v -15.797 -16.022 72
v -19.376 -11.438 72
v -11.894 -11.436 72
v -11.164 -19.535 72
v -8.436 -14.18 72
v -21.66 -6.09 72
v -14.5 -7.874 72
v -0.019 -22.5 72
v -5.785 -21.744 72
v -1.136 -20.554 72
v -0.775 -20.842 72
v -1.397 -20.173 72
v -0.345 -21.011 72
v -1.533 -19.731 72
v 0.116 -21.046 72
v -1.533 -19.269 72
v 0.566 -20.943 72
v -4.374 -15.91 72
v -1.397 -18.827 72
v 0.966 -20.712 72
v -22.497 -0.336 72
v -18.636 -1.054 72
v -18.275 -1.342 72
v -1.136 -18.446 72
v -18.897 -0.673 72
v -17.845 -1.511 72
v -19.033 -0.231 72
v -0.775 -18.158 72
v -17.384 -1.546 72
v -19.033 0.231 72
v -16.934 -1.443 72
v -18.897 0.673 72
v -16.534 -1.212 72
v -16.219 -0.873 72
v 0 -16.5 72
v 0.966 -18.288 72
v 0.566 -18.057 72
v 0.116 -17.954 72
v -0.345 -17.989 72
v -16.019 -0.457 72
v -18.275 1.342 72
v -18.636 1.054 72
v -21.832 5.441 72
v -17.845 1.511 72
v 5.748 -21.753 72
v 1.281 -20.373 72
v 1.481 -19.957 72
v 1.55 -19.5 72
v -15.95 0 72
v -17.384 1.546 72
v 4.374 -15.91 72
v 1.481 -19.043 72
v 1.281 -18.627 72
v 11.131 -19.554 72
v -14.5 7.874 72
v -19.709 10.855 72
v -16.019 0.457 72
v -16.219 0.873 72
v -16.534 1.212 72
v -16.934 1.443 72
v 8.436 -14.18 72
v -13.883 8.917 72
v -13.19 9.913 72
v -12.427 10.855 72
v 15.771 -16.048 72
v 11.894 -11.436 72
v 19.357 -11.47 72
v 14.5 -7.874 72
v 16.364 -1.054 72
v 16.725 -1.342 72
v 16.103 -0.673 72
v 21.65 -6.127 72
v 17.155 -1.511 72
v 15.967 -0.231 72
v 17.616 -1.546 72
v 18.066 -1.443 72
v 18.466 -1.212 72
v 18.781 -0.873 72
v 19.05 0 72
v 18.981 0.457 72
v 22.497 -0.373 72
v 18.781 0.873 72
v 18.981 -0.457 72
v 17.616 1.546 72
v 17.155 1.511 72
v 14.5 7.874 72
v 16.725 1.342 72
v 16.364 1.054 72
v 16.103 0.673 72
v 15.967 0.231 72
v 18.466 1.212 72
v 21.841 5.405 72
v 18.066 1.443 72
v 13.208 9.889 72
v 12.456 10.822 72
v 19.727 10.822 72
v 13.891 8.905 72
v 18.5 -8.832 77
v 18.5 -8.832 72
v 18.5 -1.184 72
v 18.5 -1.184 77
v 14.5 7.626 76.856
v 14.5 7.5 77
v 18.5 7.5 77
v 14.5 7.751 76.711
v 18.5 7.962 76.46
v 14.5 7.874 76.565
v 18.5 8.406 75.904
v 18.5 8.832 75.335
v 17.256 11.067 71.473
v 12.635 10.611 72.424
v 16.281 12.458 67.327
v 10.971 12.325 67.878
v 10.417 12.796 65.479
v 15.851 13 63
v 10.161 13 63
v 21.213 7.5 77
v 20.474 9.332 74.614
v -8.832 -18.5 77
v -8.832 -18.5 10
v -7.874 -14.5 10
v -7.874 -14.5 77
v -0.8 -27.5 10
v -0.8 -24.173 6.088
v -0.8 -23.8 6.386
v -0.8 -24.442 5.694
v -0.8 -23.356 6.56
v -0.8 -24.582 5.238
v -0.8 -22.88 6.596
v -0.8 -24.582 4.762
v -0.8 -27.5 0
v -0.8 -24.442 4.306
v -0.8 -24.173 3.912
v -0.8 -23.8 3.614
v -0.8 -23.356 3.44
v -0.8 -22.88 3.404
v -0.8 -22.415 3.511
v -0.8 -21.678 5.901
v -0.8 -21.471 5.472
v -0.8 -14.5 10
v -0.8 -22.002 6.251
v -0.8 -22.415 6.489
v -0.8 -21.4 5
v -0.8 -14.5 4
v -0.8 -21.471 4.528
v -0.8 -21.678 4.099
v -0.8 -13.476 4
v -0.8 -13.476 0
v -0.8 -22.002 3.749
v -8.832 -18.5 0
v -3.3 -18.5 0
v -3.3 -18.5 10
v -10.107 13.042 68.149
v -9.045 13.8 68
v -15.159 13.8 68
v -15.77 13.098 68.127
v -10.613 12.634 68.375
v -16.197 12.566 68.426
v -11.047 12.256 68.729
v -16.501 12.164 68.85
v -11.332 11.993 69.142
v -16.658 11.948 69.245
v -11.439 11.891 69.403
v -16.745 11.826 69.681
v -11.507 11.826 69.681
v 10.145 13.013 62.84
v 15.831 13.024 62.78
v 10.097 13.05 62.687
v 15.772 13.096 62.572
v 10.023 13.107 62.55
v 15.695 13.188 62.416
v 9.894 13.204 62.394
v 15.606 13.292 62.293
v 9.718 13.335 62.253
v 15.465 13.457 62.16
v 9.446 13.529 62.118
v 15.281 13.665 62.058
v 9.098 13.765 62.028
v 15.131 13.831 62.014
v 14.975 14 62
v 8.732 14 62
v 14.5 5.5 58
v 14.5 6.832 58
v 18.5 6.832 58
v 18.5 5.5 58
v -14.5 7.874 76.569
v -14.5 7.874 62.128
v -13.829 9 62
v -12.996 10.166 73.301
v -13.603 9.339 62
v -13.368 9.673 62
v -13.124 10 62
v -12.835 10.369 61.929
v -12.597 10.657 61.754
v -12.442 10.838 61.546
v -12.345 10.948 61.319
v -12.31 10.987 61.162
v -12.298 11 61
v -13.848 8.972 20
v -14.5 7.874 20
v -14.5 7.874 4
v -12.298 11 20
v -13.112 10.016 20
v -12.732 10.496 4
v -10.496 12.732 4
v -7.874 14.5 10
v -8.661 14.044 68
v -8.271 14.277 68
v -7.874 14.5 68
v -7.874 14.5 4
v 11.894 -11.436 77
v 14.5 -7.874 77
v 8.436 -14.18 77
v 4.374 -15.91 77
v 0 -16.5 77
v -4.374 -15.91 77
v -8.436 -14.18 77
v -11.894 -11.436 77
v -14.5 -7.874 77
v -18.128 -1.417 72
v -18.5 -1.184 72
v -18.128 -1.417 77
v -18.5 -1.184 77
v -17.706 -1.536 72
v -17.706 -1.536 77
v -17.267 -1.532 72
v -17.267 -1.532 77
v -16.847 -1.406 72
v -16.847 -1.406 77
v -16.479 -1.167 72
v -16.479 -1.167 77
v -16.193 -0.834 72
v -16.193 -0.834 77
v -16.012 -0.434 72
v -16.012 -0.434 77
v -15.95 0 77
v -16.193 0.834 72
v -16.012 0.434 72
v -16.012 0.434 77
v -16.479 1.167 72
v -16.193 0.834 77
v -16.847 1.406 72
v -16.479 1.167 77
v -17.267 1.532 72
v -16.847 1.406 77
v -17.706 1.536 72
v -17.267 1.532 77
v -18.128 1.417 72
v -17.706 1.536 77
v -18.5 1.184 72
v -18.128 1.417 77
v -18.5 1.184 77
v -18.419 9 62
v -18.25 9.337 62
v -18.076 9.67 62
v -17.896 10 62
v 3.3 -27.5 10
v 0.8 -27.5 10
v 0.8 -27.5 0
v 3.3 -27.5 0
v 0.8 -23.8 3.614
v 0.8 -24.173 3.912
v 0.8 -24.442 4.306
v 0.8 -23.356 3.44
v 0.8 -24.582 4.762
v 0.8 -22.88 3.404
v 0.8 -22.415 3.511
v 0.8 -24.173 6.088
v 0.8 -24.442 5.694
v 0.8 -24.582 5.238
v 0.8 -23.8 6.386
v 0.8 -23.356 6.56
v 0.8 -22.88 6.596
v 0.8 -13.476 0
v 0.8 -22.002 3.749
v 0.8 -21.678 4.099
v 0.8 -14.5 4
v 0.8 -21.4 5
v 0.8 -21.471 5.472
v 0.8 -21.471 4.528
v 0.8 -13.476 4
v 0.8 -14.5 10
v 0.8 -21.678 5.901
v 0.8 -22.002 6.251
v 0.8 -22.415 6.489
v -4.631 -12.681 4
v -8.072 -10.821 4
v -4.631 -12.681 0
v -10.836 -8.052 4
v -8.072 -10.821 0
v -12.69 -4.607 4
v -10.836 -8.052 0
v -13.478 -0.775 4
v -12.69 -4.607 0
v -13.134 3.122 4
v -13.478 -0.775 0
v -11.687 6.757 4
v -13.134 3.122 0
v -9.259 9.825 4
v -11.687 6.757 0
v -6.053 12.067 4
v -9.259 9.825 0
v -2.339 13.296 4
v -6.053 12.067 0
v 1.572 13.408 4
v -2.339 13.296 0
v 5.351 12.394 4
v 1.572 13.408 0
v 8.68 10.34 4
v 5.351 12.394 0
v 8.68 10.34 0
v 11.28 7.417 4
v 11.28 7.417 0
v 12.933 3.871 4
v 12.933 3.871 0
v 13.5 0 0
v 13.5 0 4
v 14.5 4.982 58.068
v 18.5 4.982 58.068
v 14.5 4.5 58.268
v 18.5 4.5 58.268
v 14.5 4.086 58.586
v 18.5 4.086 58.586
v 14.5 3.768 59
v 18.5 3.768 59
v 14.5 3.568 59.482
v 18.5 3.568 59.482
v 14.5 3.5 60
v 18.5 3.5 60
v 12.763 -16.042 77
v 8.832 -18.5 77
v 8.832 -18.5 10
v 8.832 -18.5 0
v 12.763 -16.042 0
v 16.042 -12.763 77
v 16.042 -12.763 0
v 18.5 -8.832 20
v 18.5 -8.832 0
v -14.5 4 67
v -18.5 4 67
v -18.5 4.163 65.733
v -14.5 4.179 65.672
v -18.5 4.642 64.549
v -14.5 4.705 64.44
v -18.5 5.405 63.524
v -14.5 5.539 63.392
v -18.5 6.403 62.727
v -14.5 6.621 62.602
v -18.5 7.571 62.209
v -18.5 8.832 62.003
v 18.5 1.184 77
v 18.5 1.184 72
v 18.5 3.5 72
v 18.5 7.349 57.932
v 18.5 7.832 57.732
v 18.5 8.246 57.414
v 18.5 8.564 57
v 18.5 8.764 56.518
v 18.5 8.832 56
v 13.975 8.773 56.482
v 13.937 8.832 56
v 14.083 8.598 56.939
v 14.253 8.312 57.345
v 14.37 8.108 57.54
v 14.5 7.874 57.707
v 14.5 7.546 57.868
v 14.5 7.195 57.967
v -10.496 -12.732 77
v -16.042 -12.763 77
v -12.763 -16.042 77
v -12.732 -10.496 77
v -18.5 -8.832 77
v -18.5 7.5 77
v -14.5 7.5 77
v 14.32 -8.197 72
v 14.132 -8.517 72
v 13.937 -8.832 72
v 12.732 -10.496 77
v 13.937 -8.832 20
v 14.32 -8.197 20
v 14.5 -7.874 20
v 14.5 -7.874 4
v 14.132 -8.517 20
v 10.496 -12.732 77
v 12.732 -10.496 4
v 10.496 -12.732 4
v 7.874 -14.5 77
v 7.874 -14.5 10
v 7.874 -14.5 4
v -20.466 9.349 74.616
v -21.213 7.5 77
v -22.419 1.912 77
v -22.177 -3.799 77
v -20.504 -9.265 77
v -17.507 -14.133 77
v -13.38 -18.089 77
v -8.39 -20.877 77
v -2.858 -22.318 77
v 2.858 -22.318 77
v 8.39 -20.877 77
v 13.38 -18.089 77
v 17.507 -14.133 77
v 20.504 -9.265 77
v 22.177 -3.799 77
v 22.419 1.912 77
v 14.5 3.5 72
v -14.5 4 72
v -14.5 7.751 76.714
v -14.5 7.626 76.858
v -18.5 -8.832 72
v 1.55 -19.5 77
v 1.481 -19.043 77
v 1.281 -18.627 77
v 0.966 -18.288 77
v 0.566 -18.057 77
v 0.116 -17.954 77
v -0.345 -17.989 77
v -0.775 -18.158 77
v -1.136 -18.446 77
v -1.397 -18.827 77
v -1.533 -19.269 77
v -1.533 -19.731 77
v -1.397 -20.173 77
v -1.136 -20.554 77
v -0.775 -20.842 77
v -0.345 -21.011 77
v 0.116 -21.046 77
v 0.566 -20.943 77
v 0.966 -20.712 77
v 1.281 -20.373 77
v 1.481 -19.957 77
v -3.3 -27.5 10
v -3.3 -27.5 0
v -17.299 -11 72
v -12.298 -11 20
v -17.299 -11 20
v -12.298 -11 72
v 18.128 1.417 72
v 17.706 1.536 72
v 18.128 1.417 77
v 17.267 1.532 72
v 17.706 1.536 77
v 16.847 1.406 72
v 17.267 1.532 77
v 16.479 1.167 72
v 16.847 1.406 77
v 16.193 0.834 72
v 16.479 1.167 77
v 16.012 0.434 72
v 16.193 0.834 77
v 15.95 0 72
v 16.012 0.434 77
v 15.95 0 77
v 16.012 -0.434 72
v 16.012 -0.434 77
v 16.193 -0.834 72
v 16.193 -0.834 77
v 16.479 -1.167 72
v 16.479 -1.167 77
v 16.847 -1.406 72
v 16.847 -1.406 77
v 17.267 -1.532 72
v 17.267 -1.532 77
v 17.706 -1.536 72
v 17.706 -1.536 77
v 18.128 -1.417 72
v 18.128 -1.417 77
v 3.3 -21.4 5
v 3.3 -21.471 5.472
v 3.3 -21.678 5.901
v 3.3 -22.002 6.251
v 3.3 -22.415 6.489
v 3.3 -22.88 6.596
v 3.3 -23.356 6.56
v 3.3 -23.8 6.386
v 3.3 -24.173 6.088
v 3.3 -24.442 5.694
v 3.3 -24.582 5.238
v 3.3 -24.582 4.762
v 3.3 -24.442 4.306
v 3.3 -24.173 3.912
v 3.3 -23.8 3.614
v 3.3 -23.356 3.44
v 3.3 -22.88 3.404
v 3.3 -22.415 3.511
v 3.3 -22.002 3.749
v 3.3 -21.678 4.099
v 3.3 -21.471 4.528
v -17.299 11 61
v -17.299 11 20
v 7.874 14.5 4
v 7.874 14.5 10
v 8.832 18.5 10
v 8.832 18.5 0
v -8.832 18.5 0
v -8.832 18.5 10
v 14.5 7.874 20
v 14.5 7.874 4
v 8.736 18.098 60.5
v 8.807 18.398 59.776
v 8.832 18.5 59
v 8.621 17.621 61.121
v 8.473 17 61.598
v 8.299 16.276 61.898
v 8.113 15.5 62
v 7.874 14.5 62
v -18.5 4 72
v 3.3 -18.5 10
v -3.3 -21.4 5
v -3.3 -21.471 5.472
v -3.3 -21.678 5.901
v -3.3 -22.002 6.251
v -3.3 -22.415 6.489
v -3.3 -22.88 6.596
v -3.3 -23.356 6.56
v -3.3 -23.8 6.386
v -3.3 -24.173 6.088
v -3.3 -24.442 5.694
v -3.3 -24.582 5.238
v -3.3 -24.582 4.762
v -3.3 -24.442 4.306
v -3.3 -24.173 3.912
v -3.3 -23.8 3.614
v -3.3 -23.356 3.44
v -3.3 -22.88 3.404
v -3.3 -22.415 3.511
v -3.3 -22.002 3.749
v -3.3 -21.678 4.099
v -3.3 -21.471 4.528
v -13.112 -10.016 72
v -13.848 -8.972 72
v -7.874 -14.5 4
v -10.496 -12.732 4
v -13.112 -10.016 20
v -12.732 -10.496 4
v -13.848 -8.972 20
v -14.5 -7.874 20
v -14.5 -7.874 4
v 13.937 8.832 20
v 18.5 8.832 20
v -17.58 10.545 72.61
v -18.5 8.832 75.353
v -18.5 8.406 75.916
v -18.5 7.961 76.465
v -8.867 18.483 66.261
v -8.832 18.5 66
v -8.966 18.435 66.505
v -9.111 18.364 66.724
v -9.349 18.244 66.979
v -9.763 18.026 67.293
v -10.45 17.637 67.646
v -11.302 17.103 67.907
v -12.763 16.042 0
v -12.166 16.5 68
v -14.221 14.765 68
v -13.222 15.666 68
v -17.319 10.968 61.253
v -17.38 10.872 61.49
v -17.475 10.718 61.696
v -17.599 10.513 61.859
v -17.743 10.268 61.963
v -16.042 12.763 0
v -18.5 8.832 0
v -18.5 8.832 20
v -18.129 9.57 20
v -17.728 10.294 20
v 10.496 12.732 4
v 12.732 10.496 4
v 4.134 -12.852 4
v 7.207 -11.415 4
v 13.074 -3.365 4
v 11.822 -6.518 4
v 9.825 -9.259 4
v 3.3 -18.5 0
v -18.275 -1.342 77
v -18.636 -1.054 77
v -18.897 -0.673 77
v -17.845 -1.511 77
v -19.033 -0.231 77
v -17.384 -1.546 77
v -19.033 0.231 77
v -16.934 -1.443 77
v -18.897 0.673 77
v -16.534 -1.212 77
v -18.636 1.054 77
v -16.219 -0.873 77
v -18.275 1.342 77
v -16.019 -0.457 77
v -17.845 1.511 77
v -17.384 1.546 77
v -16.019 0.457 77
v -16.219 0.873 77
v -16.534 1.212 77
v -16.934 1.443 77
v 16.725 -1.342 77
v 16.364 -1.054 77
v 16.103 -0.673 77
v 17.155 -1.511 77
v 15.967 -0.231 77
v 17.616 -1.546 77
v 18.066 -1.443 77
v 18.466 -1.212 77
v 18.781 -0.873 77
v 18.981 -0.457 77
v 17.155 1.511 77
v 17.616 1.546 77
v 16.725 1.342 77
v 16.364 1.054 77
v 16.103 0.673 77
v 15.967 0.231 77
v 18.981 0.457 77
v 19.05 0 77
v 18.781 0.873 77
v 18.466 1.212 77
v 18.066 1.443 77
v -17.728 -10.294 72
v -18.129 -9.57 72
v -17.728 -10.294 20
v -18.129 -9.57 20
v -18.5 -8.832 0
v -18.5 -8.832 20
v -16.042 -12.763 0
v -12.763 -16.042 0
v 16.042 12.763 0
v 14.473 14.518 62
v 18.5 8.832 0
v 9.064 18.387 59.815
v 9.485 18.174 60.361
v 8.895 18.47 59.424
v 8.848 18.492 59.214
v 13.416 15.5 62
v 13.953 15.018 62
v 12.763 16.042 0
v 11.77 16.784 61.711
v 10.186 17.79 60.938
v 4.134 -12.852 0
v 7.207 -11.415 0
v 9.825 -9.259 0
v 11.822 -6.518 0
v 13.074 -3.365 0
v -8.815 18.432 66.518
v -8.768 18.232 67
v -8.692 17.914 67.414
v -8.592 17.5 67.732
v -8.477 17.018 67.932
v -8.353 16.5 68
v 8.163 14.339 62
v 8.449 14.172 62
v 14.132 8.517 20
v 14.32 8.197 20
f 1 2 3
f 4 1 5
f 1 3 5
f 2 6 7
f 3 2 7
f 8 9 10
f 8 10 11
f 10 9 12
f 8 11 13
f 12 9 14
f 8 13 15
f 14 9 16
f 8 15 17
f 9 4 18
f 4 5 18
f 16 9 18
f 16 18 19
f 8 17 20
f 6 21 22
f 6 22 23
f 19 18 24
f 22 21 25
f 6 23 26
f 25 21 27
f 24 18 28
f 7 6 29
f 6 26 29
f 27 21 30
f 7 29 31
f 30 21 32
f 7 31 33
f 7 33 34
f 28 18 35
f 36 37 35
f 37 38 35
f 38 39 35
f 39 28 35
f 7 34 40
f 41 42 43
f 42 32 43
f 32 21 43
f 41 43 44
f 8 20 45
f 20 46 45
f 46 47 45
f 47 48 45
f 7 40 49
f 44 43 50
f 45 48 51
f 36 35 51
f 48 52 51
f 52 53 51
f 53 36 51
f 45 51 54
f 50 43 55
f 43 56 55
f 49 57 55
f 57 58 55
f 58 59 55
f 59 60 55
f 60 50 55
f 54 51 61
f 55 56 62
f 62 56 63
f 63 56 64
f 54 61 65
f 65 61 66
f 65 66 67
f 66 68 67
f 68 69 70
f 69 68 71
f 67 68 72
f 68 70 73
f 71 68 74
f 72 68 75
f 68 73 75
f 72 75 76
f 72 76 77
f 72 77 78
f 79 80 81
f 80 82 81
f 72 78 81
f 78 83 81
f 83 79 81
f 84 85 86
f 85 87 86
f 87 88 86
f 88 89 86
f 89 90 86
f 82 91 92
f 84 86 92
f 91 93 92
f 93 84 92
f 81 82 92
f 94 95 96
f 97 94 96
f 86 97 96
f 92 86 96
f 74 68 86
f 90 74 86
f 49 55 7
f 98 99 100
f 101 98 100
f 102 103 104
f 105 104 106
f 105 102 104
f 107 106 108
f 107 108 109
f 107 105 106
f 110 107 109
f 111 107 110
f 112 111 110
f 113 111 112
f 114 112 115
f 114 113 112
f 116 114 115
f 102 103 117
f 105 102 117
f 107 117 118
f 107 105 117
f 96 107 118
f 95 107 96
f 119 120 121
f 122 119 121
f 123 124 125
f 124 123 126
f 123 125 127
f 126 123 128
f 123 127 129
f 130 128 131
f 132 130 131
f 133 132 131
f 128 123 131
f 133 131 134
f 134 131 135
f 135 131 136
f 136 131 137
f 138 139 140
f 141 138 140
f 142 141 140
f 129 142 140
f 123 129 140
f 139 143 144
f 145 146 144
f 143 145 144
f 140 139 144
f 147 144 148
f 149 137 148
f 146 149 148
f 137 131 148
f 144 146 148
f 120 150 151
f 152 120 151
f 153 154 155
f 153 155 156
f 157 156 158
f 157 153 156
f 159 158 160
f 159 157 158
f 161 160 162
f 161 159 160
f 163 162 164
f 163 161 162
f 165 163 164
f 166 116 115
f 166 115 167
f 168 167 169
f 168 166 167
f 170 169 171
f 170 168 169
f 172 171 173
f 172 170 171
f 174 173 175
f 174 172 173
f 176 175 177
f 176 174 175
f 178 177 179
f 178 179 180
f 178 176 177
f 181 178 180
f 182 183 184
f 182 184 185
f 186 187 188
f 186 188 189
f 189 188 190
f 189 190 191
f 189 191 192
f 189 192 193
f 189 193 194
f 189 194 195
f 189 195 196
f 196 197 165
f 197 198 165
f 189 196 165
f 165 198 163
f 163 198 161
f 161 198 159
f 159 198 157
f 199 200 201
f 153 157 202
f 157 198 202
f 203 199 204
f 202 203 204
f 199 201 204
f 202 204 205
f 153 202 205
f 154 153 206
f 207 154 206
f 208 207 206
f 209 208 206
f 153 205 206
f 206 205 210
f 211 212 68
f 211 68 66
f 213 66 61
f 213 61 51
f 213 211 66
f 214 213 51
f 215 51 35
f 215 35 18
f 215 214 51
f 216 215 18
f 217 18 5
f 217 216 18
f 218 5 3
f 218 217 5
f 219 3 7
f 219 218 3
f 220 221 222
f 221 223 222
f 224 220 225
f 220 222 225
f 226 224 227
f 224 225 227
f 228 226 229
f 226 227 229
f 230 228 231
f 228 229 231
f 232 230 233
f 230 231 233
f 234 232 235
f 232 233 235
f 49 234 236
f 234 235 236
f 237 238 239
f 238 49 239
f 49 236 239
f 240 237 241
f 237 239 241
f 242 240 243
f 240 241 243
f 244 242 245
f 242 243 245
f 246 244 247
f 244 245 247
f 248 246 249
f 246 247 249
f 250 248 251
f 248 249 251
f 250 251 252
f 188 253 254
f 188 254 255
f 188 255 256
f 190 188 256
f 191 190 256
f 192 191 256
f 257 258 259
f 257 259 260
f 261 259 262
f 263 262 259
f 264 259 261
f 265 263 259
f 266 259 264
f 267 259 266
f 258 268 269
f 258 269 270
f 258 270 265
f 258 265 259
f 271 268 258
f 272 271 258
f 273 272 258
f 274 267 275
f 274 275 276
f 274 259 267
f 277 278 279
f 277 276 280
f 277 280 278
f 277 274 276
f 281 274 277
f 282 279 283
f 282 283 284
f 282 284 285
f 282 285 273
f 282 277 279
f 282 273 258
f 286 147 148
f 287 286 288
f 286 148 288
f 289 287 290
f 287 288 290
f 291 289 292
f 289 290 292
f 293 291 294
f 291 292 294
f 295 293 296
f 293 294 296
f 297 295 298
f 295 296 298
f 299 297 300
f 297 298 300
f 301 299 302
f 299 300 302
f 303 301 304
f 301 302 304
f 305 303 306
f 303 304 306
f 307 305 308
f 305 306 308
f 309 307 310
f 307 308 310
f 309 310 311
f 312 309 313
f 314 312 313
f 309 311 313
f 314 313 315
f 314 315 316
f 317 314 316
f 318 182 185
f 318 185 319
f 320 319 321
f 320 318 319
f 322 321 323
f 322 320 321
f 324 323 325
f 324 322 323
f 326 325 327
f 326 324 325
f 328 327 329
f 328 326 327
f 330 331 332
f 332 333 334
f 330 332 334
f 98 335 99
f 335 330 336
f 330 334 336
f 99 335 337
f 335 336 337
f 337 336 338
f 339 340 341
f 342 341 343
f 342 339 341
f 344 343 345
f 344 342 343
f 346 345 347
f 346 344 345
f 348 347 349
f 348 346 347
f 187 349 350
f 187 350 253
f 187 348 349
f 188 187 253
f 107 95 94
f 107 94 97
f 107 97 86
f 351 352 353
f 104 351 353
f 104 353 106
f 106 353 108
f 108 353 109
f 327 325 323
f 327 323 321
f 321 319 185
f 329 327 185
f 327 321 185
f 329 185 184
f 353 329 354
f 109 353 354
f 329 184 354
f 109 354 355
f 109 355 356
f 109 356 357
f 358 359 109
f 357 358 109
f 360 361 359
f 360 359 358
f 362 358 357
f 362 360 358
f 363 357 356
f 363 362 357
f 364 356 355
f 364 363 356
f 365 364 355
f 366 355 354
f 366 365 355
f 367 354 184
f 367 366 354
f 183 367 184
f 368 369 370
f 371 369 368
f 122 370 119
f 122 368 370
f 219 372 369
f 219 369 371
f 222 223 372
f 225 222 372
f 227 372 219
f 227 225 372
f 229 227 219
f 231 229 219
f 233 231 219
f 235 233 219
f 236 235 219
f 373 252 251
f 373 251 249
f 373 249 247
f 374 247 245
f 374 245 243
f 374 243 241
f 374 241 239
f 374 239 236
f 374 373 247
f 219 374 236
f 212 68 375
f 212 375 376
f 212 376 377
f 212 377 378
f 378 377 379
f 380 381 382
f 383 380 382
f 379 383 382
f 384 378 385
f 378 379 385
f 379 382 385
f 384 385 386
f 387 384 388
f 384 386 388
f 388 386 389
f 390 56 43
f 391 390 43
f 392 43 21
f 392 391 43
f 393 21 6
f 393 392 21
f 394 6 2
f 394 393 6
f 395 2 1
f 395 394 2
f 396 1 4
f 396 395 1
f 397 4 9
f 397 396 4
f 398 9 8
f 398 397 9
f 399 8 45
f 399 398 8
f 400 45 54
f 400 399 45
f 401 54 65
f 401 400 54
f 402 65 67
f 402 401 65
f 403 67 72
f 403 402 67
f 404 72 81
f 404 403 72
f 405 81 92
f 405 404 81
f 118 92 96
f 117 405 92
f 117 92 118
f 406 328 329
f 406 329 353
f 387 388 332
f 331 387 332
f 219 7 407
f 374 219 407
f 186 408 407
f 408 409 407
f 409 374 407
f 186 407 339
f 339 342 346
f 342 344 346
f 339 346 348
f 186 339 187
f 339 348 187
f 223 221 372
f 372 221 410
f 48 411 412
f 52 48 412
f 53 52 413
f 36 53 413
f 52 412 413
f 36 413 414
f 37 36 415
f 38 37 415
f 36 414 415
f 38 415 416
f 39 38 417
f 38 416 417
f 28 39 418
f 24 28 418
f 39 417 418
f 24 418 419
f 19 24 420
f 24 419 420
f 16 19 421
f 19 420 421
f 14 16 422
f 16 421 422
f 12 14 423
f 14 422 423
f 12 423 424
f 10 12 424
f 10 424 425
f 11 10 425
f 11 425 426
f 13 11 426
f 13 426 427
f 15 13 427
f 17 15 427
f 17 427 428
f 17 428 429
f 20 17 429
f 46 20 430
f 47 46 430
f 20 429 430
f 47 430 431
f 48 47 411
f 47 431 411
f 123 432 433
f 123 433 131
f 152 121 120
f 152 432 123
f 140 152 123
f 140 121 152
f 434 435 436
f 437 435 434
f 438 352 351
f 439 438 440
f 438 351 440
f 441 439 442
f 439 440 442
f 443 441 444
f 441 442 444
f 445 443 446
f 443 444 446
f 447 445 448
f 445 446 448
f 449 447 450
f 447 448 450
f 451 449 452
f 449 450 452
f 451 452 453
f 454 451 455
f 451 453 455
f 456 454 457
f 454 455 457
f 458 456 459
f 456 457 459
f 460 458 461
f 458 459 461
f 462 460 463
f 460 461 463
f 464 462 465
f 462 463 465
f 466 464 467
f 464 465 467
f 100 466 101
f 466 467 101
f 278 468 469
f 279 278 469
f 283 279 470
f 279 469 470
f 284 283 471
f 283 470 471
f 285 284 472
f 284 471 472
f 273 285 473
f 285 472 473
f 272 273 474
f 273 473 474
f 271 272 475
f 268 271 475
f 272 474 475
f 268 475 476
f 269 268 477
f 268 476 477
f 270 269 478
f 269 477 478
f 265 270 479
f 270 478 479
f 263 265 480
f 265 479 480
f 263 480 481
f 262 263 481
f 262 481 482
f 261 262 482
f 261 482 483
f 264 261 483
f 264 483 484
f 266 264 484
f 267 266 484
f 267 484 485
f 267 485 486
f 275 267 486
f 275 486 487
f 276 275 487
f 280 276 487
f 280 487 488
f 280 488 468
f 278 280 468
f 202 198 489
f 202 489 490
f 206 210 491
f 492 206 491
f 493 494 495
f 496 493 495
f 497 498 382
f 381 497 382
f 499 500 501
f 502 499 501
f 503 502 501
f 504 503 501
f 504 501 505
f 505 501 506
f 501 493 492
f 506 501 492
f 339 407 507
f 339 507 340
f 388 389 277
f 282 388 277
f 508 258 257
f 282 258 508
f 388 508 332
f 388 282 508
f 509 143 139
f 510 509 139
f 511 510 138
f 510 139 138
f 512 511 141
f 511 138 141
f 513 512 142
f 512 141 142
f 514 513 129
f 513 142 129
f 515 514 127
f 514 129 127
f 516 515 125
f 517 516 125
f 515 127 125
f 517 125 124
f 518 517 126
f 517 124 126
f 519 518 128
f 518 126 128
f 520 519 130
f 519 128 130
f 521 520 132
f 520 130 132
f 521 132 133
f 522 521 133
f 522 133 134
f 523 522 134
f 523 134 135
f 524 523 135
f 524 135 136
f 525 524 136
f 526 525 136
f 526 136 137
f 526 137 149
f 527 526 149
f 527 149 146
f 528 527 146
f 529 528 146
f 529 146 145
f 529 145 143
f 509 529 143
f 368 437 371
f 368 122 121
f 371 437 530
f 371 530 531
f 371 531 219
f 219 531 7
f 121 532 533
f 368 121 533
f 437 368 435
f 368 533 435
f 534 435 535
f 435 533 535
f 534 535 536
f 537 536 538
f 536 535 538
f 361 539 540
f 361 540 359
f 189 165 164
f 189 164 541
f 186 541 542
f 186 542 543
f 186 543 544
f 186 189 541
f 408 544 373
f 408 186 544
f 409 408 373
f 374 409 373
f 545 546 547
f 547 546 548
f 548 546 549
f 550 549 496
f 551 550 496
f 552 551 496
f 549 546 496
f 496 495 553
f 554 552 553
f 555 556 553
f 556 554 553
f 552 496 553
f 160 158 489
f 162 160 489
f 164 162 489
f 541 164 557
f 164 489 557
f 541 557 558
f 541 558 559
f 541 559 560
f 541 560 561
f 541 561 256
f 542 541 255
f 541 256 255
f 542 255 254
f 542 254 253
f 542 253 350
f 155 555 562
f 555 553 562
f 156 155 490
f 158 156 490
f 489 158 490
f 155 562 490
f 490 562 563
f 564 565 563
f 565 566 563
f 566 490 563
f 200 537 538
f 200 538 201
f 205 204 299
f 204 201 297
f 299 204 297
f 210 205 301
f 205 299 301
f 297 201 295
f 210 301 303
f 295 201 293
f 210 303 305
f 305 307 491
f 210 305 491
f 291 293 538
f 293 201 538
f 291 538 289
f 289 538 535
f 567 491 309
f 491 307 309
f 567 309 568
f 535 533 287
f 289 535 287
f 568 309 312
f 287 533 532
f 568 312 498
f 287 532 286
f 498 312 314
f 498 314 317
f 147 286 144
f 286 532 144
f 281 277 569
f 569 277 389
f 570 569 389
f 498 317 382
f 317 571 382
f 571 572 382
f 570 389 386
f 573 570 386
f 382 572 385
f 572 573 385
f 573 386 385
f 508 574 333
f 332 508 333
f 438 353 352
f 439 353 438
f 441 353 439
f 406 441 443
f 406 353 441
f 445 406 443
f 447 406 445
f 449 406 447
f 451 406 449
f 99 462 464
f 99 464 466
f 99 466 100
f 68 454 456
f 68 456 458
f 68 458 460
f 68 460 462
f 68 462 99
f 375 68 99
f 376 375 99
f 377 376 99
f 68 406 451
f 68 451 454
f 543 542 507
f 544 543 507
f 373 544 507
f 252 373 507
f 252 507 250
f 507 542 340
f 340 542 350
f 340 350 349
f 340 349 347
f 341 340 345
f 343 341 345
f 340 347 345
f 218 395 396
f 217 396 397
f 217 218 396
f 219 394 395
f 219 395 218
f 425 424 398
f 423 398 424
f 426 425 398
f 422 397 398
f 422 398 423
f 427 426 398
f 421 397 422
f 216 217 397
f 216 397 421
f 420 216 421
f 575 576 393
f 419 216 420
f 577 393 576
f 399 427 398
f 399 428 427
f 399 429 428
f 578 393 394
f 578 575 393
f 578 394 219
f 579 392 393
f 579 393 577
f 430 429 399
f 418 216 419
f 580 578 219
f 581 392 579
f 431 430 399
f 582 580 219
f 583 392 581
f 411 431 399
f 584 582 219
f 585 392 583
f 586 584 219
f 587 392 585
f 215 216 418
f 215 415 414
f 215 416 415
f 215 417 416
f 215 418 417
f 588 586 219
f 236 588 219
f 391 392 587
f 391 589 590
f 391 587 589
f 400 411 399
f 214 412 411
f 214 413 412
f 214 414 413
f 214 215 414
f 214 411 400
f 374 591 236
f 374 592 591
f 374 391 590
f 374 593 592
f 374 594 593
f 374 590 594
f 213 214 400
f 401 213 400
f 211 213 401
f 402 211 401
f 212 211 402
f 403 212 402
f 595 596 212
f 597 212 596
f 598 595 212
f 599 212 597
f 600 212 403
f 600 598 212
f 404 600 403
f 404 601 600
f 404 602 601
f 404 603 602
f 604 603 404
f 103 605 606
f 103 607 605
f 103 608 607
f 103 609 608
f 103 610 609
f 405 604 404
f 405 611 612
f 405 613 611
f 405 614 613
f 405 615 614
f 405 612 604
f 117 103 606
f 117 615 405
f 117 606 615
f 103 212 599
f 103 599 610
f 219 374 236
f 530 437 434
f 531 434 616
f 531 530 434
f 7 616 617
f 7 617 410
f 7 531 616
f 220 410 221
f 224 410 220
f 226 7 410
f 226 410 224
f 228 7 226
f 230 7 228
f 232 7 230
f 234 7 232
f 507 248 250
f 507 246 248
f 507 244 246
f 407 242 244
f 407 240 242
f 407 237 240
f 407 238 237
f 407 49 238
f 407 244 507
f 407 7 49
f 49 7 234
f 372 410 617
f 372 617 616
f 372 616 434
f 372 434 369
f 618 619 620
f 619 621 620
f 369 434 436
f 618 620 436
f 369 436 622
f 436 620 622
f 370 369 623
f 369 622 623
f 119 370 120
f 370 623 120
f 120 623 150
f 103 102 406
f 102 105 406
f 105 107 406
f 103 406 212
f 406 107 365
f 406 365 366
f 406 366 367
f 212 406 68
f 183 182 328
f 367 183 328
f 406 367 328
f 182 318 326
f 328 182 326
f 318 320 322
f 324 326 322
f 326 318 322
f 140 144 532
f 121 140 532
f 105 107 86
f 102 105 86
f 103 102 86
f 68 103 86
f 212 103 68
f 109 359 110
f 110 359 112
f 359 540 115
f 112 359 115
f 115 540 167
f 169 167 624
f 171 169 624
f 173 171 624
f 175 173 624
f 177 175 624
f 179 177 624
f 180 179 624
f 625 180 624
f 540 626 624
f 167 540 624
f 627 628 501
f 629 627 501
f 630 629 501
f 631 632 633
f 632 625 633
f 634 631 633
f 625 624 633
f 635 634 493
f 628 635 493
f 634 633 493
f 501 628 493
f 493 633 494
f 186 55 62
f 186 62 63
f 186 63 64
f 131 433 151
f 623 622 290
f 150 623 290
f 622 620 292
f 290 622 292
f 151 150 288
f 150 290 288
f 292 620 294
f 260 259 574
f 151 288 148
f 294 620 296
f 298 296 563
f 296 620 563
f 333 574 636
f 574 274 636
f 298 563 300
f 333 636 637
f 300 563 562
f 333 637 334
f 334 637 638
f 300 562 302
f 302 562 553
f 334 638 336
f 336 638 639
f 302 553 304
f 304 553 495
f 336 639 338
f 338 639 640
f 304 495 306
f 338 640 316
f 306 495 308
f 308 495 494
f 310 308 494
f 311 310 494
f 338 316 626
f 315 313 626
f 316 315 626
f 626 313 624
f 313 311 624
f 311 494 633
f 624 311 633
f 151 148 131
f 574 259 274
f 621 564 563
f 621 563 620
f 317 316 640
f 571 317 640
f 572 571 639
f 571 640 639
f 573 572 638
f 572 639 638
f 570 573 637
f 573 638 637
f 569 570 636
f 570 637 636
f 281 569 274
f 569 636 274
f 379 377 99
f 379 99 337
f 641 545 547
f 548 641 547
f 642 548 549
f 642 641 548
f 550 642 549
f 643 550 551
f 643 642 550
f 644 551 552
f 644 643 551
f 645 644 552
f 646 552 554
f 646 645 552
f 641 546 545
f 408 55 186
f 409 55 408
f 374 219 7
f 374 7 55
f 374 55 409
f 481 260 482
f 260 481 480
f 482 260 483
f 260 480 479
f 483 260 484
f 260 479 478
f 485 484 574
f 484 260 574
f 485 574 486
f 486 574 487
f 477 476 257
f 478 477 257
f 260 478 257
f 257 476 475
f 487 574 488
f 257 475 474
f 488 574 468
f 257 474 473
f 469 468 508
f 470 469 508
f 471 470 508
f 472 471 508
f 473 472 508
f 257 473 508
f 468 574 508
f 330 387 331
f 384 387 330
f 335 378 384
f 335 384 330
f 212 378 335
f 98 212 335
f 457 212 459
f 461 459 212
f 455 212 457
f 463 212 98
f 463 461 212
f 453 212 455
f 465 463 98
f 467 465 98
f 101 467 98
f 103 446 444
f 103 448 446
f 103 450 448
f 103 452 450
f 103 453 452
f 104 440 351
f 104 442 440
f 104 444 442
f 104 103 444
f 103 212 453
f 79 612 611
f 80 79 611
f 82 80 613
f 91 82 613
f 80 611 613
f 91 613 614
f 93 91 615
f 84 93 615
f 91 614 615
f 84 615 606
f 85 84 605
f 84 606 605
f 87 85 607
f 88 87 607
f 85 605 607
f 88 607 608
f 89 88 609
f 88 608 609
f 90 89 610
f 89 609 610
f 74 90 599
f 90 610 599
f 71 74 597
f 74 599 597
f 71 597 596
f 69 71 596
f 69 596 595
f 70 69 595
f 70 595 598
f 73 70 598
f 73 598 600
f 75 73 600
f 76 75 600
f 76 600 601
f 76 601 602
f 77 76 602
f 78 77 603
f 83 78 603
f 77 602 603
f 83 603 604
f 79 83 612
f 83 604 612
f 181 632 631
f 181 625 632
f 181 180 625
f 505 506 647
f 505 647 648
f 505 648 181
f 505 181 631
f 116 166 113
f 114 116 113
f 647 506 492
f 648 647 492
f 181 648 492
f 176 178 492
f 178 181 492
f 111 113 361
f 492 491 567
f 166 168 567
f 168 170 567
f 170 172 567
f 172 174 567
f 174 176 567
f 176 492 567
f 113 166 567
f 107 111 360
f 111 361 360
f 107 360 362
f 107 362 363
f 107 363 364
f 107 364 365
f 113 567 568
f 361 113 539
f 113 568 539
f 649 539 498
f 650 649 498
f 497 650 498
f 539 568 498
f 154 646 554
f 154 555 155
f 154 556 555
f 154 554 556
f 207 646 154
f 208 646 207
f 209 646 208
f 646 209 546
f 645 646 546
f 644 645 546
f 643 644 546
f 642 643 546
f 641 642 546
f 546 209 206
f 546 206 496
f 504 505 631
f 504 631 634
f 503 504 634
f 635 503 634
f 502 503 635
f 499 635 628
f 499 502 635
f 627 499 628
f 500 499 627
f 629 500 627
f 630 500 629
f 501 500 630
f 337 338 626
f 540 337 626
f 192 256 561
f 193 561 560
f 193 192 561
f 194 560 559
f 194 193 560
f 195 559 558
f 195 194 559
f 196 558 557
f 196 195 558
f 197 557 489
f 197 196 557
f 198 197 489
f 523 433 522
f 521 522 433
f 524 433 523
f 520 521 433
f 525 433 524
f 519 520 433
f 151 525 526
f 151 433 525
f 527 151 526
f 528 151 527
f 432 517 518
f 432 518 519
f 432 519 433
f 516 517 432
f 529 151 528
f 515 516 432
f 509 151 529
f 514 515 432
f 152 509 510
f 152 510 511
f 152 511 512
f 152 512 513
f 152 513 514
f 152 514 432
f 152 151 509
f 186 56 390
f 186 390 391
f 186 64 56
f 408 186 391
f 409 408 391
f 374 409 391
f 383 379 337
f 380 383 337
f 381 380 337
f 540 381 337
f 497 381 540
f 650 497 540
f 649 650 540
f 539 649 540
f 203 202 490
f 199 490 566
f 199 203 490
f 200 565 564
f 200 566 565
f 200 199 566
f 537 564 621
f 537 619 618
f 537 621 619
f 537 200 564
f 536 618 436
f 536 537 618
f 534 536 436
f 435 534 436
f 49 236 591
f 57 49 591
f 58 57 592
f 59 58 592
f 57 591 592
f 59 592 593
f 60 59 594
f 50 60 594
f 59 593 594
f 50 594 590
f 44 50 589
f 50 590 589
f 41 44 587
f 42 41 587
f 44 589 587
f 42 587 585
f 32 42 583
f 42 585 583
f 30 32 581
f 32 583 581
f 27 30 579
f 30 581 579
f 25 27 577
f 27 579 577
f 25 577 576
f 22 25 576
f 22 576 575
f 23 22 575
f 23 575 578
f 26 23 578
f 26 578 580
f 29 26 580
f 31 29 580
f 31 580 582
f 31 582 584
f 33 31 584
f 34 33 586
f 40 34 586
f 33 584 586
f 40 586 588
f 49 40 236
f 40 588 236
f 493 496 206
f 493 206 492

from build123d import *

# Parameters (mm, degrees)
F1_DEPTH       = 10
F3_DEPTH       = 67
F5_DEPTH       = 5
F6_R           = 1.55
F7_DEPTH       = 5
F8_R           = 13.5
F9_DEPTH       = 4
F11_DEPTH      = 20
F11_DEPTH_BACK = 10
F13_DEPTH      = 20
F13_DEPTH_BACK = 10
F15_DEPTH      = 10
F16_W          = 2.5
F16_H          = 10
F17_DEPTH      = 9
F18_R          = 1.6
F19_DEPTH      = 6.6


with BuildPart() as f1:
    # F0 (on Top) → F1 (new body)
    with BuildSketch(Plane.XY):
        with BuildLine():
            Line((8.8317608663, 18.5), (-8.8317608663, 18.5))
            ThreePointArc((-8.8317608663, 18.5), (-14.4956890143, 14.4956890143), (-18.5, 8.8317608663))
            Line((-18.5, 8.8317608663), (-18.5, -8.8317608663))
            ThreePointArc((-18.5, -8.8317608663), (-14.4956890143, -14.4956890143), (-8.8317608663, -18.5))
            Line((-8.8317608663, -18.5), (8.8317608663, -18.5))
            ThreePointArc((8.8317608663, -18.5), (14.4956890143, -14.4956890143), (18.5, -8.8317608663))
            Line((18.5, -8.8317608663), (18.5, 8.8317608663))
            ThreePointArc((18.5, 8.8317608663), (14.4956890143, 14.4956890143), (8.8317608663, 18.5))
        make_face()
        with BuildLine():
            ThreePointArc((-14.5, 7.874007874), (-11.6672618896, 11.6672618896), (-7.874007874, 14.5))
            Line((-7.874007874, 14.5), (7.874007874, 14.5))
            ThreePointArc((7.874007874, 14.5), (11.6672618896, 11.6672618896), (14.5, 7.874007874))
            Line((14.5, 7.874007874), (14.5, -7.874007874))
            ThreePointArc((14.5, -7.874007874), (11.6672618896, -11.6672618896), (7.874007874, -14.5))
            Line((7.874007874, -14.5), (-7.874007874, -14.5))
            ThreePointArc((-7.874007874, -14.5), (-11.6672618896, -11.6672618896), (-14.5, -7.874007874))
            Line((-14.5, -7.874007874), (-14.5, 7.874007874))
        make_face(mode=Mode.SUBTRACT)
    extrude(amount=F1_DEPTH)

    # F2 (on face) → F3 (join)
    with BuildSketch(Plane.XY.offset(10)):
        with BuildLine():
            Line((7.874007874, -14.5), (8.8317608663, -18.5))
            ThreePointArc((8.8317608663, -18.5), (14.4956890143, -14.4956890143), (18.5, -8.8317608663))
            Line((18.5, -8.8317608663), (18.5, 8.8317608663))
            ThreePointArc((18.5, 8.8317608663), (14.4956890143, 14.4956890143), (8.8317608663, 18.5))
            Line((8.8317608663, 18.5), (7.874007874, 14.5))
            ThreePointArc((7.874007874, 14.5), (11.6672618896, 11.6672618896), (14.5, 7.874007874))
            Line((14.5, 7.874007874), (14.5, -7.874007874))
            ThreePointArc((14.5, -7.874007874), (11.6672618896, -11.6672618896), (7.874007874, -14.5))
        make_face()
        with BuildLine():
            ThreePointArc((-18.5, -8.8317608663), (-14.4956890143, -14.4956890143), (-8.8317608663, -18.5))
            Line((-8.8317608663, -18.5), (-7.874007874, -14.5))
            ThreePointArc((-7.874007874, -14.5), (-11.6672618896, -11.6672618896), (-14.5, -7.874007874))
            Line((-14.5, -7.874007874), (-14.5, 7.874007874))
            ThreePointArc((-14.5, 7.874007874), (-11.6672618896, 11.6672618896), (-7.874007874, 14.5))
            Line((-7.874007874, 14.5), (-8.8317608663, 18.5))
            ThreePointArc((-8.8317608663, 18.5), (-14.4956890143, 14.4956890143), (-18.5, 8.8317608663))
            Line((-18.5, 8.8317608663), (-18.5, -8.8317608663))
        make_face()
    extrude(amount=F3_DEPTH)


with BuildPart() as f5:
    # F4 (on face) → F5 (new body)
    with BuildSketch(Plane.XY.offset(77)):
        with BuildLine():
            Line((12.8062484749, 18.5), (-12.8062484749, 18.5))
            ThreePointArc((-12.8062484749, 18.5), (0, -22.5), (12.8062484749, 18.5))
        make_face()
        with BuildLine():
            ThreePointArc((14.5, -7.874007874), (0, -16.5), (-14.5, -7.874007874))
            Line((-14.5, -7.874007874), (-14.5, 7.874007874))
            ThreePointArc((-14.5, 7.874007874), (0, 16.5), (14.5, 7.874007874))
            Line((14.5, 7.874007874), (14.5, -7.874007874))
        make_face(mode=Mode.SUBTRACT)
    extrude(amount=-F5_DEPTH)


with BuildPart() as f7_tool:
    # F6 (on face) → F7 (new body)
    with BuildSketch(Plane.XY.offset(77)):
        with Locations((0, -19.5)):
            Circle(F6_R)
        with Locations((17.5, 0)):
            Circle(F6_R)
        with Locations((-17.5, 0)):
            Circle(F6_R)
    extrude(amount=-F7_DEPTH)


with BuildPart() as f1_1:
    add(f1.part)

    # F7: cut by f7_tool
    add(f7_tool.part, mode=Mode.SUBTRACT)

    # F8 (on face) → F9 (join)
    with BuildSketch(Plane(origin=(0, 0, 0), x_dir=(1, 0, 0), z_dir=(0, 0, -1))):
        with BuildLine():
            ThreePointArc((-7.874007874, 14.5), (-11.6672618896, 11.6672618896), (-14.5, 7.874007874))
            Line((-14.5, 7.874007874), (-14.5, -7.874007874))
            ThreePointArc((-14.5, -7.874007874), (-11.6672618896, -11.6672618896), (-7.874007874, -14.5))
            Line((-7.874007874, -14.5), (7.874007874, -14.5))
            ThreePointArc((7.874007874, -14.5), (11.6672618896, -11.6672618896), (14.5, -7.874007874))
            Line((14.5, -7.874007874), (14.5, 7.874007874))
            ThreePointArc((14.5, 7.874007874), (11.6672618896, 11.6672618896), (7.874007874, 14.5))
            Line((7.874007874, 14.5), (-7.874007874, 14.5))
        make_face()
        Circle(F8_R, mode=Mode.SUBTRACT)
    extrude(amount=-F9_DEPTH)


with BuildPart() as f5_1:
    add(f5.part)

    # F7: cut by f7_tool
    add(f7_tool.part, mode=Mode.SUBTRACT)


with BuildPart() as f11_tool:
    # F10 (on face) → F11 (new body, two sides)
    with BuildSketch(Plane.YZ.offset(18.5)) as f11_sk:
        with BuildLine():
            Line((-8.8317608663, 72), (-8.8317608663, 20))
            Line((-8.8317608663, 20), (8.8317608663, 20))
            Line((8.8317608663, 20), (8.8317608663, 56))
            ThreePointArc((8.8317608663, 56), (8.2459744287, 57.4142135624), (6.8317608663, 58))
            Line((6.8317608663, 58), (5.5, 58))
            ThreePointArc((5.5, 58), (4.0857864376, 58.5857864376), (3.5, 60))
            Line((3.5, 60), (3.5, 72))
            Line((3.5, 72), (0, 72))
            Line((0, 72), (-8.8317608663, 72))
        make_face()
        with BuildLine():
            Line((18.5, 59), (18.5, 72))
            Line((18.5, 72), (18.5, 77))
            Line((18.5, 77), (7.5, 77))
            ThreePointArc((7.5, 77), (11.4836537107, 70.484649672), (13, 63))
            ThreePointArc((13, 63), (13.2928932188, 62.2928932188), (14, 62))
            Line((14, 62), (15.5, 62))
            ThreePointArc((15.5, 62), (17.6213203436, 61.1213203436), (18.5, 59))
        make_face()
    extrude(amount=-F11_DEPTH)
    extrude(f11_sk.sketch, amount=F11_DEPTH_BACK)


with BuildPart() as f1_2:
    add(f1_1.part)

    # F11: cut by f11_tool
    add(f11_tool.part, mode=Mode.SUBTRACT)


with BuildPart() as f5_2:
    add(f5_1.part)

    # F11: cut by f11_tool
    add(f11_tool.part, mode=Mode.SUBTRACT)


with BuildPart() as f13_tool:
    # F12 (on face) → F13 (new body, two sides)
    with BuildSketch(Plane(origin=(-18.5, 0, 0), x_dir=(0, -1, 0), z_dir=(-1, 0, 0))) as f13_sk:
        with BuildLine():
            Line((11, 72), (0, 72))
            Line((0, 72), (-4, 72))
            Line((-4, 72), (-4, 67))
            ThreePointArc((-4, 67), (-5.4644660941, 63.4644660941), (-9, 62))
            Line((-9, 62), (-10, 62))
            ThreePointArc((-10, 62), (-10.7071067812, 61.7071067812), (-11, 61))
            Line((-11, 61), (-11, 20))
            Line((-11, 20), (11, 20))
            Line((11, 20), (11, 72))
        make_face()
        with BuildLine():
            Line((-7.5, 77), (-18.5, 77))
            Line((-18.5, 77), (-18.5, 66))
            ThreePointArc((-18.5, 66), (-17.9142135624, 67.4142135624), (-16.5, 68))
            Line((-16.5, 68), (-13.8, 68))
            ThreePointArc((-13.8, 68), (-12.5035269253, 68.4771219463), (-11.8256296073, 69.6808424335))
            ThreePointArc((-11.8256296073, 69.6808424335), (-10.0197361412, 73.5513620923), (-7.5, 77))
        make_face()
    extrude(amount=-F13_DEPTH)
    extrude(f13_sk.sketch, amount=F13_DEPTH_BACK)


with BuildPart() as f1_3:
    add(f1_2.part)

    # F13: cut by f13_tool
    add(f13_tool.part, mode=Mode.SUBTRACT)

    # F14 (on face) → F15 (cut)
    with BuildSketch(Plane(origin=(0, 0, 0), x_dir=(1, 0, 0), z_dir=(0, 0, -1))):
        Polygon((-0.8, 11.8399746716), (0, 11.8399746716), (0.8, 11.8399746716), (0.8, 23.3050715178), (0, 23.3050715178), (-0.8, 23.3050715178), align=None)
    extrude(amount=-F15_DEPTH, mode=Mode.SUBTRACT)

    # F16 (on face) → F17 (join)
    with BuildSketch(Plane.XZ.offset(18.5)):
        with Locations((2.05, 5)):
            Rectangle(F16_W, F16_H)
        with Locations((-2.05, 5)):
            Rectangle(F16_W, F16_H)
    extrude(amount=F17_DEPTH)

    # F18 (on face) → F19 (cut, through all)
    with BuildSketch(Plane.YZ.offset(3.3)):
        with Locations((-23, 5)):
            Circle(F18_R)
    extrude(amount=-F19_DEPTH, mode=Mode.SUBTRACT)


with BuildPart() as f5_3:
    add(f5_2.part)

    # F13: cut by f13_tool
    add(f13_tool.part, mode=Mode.SUBTRACT)


solid = Compound([f1_3.part, f5_3.part])
